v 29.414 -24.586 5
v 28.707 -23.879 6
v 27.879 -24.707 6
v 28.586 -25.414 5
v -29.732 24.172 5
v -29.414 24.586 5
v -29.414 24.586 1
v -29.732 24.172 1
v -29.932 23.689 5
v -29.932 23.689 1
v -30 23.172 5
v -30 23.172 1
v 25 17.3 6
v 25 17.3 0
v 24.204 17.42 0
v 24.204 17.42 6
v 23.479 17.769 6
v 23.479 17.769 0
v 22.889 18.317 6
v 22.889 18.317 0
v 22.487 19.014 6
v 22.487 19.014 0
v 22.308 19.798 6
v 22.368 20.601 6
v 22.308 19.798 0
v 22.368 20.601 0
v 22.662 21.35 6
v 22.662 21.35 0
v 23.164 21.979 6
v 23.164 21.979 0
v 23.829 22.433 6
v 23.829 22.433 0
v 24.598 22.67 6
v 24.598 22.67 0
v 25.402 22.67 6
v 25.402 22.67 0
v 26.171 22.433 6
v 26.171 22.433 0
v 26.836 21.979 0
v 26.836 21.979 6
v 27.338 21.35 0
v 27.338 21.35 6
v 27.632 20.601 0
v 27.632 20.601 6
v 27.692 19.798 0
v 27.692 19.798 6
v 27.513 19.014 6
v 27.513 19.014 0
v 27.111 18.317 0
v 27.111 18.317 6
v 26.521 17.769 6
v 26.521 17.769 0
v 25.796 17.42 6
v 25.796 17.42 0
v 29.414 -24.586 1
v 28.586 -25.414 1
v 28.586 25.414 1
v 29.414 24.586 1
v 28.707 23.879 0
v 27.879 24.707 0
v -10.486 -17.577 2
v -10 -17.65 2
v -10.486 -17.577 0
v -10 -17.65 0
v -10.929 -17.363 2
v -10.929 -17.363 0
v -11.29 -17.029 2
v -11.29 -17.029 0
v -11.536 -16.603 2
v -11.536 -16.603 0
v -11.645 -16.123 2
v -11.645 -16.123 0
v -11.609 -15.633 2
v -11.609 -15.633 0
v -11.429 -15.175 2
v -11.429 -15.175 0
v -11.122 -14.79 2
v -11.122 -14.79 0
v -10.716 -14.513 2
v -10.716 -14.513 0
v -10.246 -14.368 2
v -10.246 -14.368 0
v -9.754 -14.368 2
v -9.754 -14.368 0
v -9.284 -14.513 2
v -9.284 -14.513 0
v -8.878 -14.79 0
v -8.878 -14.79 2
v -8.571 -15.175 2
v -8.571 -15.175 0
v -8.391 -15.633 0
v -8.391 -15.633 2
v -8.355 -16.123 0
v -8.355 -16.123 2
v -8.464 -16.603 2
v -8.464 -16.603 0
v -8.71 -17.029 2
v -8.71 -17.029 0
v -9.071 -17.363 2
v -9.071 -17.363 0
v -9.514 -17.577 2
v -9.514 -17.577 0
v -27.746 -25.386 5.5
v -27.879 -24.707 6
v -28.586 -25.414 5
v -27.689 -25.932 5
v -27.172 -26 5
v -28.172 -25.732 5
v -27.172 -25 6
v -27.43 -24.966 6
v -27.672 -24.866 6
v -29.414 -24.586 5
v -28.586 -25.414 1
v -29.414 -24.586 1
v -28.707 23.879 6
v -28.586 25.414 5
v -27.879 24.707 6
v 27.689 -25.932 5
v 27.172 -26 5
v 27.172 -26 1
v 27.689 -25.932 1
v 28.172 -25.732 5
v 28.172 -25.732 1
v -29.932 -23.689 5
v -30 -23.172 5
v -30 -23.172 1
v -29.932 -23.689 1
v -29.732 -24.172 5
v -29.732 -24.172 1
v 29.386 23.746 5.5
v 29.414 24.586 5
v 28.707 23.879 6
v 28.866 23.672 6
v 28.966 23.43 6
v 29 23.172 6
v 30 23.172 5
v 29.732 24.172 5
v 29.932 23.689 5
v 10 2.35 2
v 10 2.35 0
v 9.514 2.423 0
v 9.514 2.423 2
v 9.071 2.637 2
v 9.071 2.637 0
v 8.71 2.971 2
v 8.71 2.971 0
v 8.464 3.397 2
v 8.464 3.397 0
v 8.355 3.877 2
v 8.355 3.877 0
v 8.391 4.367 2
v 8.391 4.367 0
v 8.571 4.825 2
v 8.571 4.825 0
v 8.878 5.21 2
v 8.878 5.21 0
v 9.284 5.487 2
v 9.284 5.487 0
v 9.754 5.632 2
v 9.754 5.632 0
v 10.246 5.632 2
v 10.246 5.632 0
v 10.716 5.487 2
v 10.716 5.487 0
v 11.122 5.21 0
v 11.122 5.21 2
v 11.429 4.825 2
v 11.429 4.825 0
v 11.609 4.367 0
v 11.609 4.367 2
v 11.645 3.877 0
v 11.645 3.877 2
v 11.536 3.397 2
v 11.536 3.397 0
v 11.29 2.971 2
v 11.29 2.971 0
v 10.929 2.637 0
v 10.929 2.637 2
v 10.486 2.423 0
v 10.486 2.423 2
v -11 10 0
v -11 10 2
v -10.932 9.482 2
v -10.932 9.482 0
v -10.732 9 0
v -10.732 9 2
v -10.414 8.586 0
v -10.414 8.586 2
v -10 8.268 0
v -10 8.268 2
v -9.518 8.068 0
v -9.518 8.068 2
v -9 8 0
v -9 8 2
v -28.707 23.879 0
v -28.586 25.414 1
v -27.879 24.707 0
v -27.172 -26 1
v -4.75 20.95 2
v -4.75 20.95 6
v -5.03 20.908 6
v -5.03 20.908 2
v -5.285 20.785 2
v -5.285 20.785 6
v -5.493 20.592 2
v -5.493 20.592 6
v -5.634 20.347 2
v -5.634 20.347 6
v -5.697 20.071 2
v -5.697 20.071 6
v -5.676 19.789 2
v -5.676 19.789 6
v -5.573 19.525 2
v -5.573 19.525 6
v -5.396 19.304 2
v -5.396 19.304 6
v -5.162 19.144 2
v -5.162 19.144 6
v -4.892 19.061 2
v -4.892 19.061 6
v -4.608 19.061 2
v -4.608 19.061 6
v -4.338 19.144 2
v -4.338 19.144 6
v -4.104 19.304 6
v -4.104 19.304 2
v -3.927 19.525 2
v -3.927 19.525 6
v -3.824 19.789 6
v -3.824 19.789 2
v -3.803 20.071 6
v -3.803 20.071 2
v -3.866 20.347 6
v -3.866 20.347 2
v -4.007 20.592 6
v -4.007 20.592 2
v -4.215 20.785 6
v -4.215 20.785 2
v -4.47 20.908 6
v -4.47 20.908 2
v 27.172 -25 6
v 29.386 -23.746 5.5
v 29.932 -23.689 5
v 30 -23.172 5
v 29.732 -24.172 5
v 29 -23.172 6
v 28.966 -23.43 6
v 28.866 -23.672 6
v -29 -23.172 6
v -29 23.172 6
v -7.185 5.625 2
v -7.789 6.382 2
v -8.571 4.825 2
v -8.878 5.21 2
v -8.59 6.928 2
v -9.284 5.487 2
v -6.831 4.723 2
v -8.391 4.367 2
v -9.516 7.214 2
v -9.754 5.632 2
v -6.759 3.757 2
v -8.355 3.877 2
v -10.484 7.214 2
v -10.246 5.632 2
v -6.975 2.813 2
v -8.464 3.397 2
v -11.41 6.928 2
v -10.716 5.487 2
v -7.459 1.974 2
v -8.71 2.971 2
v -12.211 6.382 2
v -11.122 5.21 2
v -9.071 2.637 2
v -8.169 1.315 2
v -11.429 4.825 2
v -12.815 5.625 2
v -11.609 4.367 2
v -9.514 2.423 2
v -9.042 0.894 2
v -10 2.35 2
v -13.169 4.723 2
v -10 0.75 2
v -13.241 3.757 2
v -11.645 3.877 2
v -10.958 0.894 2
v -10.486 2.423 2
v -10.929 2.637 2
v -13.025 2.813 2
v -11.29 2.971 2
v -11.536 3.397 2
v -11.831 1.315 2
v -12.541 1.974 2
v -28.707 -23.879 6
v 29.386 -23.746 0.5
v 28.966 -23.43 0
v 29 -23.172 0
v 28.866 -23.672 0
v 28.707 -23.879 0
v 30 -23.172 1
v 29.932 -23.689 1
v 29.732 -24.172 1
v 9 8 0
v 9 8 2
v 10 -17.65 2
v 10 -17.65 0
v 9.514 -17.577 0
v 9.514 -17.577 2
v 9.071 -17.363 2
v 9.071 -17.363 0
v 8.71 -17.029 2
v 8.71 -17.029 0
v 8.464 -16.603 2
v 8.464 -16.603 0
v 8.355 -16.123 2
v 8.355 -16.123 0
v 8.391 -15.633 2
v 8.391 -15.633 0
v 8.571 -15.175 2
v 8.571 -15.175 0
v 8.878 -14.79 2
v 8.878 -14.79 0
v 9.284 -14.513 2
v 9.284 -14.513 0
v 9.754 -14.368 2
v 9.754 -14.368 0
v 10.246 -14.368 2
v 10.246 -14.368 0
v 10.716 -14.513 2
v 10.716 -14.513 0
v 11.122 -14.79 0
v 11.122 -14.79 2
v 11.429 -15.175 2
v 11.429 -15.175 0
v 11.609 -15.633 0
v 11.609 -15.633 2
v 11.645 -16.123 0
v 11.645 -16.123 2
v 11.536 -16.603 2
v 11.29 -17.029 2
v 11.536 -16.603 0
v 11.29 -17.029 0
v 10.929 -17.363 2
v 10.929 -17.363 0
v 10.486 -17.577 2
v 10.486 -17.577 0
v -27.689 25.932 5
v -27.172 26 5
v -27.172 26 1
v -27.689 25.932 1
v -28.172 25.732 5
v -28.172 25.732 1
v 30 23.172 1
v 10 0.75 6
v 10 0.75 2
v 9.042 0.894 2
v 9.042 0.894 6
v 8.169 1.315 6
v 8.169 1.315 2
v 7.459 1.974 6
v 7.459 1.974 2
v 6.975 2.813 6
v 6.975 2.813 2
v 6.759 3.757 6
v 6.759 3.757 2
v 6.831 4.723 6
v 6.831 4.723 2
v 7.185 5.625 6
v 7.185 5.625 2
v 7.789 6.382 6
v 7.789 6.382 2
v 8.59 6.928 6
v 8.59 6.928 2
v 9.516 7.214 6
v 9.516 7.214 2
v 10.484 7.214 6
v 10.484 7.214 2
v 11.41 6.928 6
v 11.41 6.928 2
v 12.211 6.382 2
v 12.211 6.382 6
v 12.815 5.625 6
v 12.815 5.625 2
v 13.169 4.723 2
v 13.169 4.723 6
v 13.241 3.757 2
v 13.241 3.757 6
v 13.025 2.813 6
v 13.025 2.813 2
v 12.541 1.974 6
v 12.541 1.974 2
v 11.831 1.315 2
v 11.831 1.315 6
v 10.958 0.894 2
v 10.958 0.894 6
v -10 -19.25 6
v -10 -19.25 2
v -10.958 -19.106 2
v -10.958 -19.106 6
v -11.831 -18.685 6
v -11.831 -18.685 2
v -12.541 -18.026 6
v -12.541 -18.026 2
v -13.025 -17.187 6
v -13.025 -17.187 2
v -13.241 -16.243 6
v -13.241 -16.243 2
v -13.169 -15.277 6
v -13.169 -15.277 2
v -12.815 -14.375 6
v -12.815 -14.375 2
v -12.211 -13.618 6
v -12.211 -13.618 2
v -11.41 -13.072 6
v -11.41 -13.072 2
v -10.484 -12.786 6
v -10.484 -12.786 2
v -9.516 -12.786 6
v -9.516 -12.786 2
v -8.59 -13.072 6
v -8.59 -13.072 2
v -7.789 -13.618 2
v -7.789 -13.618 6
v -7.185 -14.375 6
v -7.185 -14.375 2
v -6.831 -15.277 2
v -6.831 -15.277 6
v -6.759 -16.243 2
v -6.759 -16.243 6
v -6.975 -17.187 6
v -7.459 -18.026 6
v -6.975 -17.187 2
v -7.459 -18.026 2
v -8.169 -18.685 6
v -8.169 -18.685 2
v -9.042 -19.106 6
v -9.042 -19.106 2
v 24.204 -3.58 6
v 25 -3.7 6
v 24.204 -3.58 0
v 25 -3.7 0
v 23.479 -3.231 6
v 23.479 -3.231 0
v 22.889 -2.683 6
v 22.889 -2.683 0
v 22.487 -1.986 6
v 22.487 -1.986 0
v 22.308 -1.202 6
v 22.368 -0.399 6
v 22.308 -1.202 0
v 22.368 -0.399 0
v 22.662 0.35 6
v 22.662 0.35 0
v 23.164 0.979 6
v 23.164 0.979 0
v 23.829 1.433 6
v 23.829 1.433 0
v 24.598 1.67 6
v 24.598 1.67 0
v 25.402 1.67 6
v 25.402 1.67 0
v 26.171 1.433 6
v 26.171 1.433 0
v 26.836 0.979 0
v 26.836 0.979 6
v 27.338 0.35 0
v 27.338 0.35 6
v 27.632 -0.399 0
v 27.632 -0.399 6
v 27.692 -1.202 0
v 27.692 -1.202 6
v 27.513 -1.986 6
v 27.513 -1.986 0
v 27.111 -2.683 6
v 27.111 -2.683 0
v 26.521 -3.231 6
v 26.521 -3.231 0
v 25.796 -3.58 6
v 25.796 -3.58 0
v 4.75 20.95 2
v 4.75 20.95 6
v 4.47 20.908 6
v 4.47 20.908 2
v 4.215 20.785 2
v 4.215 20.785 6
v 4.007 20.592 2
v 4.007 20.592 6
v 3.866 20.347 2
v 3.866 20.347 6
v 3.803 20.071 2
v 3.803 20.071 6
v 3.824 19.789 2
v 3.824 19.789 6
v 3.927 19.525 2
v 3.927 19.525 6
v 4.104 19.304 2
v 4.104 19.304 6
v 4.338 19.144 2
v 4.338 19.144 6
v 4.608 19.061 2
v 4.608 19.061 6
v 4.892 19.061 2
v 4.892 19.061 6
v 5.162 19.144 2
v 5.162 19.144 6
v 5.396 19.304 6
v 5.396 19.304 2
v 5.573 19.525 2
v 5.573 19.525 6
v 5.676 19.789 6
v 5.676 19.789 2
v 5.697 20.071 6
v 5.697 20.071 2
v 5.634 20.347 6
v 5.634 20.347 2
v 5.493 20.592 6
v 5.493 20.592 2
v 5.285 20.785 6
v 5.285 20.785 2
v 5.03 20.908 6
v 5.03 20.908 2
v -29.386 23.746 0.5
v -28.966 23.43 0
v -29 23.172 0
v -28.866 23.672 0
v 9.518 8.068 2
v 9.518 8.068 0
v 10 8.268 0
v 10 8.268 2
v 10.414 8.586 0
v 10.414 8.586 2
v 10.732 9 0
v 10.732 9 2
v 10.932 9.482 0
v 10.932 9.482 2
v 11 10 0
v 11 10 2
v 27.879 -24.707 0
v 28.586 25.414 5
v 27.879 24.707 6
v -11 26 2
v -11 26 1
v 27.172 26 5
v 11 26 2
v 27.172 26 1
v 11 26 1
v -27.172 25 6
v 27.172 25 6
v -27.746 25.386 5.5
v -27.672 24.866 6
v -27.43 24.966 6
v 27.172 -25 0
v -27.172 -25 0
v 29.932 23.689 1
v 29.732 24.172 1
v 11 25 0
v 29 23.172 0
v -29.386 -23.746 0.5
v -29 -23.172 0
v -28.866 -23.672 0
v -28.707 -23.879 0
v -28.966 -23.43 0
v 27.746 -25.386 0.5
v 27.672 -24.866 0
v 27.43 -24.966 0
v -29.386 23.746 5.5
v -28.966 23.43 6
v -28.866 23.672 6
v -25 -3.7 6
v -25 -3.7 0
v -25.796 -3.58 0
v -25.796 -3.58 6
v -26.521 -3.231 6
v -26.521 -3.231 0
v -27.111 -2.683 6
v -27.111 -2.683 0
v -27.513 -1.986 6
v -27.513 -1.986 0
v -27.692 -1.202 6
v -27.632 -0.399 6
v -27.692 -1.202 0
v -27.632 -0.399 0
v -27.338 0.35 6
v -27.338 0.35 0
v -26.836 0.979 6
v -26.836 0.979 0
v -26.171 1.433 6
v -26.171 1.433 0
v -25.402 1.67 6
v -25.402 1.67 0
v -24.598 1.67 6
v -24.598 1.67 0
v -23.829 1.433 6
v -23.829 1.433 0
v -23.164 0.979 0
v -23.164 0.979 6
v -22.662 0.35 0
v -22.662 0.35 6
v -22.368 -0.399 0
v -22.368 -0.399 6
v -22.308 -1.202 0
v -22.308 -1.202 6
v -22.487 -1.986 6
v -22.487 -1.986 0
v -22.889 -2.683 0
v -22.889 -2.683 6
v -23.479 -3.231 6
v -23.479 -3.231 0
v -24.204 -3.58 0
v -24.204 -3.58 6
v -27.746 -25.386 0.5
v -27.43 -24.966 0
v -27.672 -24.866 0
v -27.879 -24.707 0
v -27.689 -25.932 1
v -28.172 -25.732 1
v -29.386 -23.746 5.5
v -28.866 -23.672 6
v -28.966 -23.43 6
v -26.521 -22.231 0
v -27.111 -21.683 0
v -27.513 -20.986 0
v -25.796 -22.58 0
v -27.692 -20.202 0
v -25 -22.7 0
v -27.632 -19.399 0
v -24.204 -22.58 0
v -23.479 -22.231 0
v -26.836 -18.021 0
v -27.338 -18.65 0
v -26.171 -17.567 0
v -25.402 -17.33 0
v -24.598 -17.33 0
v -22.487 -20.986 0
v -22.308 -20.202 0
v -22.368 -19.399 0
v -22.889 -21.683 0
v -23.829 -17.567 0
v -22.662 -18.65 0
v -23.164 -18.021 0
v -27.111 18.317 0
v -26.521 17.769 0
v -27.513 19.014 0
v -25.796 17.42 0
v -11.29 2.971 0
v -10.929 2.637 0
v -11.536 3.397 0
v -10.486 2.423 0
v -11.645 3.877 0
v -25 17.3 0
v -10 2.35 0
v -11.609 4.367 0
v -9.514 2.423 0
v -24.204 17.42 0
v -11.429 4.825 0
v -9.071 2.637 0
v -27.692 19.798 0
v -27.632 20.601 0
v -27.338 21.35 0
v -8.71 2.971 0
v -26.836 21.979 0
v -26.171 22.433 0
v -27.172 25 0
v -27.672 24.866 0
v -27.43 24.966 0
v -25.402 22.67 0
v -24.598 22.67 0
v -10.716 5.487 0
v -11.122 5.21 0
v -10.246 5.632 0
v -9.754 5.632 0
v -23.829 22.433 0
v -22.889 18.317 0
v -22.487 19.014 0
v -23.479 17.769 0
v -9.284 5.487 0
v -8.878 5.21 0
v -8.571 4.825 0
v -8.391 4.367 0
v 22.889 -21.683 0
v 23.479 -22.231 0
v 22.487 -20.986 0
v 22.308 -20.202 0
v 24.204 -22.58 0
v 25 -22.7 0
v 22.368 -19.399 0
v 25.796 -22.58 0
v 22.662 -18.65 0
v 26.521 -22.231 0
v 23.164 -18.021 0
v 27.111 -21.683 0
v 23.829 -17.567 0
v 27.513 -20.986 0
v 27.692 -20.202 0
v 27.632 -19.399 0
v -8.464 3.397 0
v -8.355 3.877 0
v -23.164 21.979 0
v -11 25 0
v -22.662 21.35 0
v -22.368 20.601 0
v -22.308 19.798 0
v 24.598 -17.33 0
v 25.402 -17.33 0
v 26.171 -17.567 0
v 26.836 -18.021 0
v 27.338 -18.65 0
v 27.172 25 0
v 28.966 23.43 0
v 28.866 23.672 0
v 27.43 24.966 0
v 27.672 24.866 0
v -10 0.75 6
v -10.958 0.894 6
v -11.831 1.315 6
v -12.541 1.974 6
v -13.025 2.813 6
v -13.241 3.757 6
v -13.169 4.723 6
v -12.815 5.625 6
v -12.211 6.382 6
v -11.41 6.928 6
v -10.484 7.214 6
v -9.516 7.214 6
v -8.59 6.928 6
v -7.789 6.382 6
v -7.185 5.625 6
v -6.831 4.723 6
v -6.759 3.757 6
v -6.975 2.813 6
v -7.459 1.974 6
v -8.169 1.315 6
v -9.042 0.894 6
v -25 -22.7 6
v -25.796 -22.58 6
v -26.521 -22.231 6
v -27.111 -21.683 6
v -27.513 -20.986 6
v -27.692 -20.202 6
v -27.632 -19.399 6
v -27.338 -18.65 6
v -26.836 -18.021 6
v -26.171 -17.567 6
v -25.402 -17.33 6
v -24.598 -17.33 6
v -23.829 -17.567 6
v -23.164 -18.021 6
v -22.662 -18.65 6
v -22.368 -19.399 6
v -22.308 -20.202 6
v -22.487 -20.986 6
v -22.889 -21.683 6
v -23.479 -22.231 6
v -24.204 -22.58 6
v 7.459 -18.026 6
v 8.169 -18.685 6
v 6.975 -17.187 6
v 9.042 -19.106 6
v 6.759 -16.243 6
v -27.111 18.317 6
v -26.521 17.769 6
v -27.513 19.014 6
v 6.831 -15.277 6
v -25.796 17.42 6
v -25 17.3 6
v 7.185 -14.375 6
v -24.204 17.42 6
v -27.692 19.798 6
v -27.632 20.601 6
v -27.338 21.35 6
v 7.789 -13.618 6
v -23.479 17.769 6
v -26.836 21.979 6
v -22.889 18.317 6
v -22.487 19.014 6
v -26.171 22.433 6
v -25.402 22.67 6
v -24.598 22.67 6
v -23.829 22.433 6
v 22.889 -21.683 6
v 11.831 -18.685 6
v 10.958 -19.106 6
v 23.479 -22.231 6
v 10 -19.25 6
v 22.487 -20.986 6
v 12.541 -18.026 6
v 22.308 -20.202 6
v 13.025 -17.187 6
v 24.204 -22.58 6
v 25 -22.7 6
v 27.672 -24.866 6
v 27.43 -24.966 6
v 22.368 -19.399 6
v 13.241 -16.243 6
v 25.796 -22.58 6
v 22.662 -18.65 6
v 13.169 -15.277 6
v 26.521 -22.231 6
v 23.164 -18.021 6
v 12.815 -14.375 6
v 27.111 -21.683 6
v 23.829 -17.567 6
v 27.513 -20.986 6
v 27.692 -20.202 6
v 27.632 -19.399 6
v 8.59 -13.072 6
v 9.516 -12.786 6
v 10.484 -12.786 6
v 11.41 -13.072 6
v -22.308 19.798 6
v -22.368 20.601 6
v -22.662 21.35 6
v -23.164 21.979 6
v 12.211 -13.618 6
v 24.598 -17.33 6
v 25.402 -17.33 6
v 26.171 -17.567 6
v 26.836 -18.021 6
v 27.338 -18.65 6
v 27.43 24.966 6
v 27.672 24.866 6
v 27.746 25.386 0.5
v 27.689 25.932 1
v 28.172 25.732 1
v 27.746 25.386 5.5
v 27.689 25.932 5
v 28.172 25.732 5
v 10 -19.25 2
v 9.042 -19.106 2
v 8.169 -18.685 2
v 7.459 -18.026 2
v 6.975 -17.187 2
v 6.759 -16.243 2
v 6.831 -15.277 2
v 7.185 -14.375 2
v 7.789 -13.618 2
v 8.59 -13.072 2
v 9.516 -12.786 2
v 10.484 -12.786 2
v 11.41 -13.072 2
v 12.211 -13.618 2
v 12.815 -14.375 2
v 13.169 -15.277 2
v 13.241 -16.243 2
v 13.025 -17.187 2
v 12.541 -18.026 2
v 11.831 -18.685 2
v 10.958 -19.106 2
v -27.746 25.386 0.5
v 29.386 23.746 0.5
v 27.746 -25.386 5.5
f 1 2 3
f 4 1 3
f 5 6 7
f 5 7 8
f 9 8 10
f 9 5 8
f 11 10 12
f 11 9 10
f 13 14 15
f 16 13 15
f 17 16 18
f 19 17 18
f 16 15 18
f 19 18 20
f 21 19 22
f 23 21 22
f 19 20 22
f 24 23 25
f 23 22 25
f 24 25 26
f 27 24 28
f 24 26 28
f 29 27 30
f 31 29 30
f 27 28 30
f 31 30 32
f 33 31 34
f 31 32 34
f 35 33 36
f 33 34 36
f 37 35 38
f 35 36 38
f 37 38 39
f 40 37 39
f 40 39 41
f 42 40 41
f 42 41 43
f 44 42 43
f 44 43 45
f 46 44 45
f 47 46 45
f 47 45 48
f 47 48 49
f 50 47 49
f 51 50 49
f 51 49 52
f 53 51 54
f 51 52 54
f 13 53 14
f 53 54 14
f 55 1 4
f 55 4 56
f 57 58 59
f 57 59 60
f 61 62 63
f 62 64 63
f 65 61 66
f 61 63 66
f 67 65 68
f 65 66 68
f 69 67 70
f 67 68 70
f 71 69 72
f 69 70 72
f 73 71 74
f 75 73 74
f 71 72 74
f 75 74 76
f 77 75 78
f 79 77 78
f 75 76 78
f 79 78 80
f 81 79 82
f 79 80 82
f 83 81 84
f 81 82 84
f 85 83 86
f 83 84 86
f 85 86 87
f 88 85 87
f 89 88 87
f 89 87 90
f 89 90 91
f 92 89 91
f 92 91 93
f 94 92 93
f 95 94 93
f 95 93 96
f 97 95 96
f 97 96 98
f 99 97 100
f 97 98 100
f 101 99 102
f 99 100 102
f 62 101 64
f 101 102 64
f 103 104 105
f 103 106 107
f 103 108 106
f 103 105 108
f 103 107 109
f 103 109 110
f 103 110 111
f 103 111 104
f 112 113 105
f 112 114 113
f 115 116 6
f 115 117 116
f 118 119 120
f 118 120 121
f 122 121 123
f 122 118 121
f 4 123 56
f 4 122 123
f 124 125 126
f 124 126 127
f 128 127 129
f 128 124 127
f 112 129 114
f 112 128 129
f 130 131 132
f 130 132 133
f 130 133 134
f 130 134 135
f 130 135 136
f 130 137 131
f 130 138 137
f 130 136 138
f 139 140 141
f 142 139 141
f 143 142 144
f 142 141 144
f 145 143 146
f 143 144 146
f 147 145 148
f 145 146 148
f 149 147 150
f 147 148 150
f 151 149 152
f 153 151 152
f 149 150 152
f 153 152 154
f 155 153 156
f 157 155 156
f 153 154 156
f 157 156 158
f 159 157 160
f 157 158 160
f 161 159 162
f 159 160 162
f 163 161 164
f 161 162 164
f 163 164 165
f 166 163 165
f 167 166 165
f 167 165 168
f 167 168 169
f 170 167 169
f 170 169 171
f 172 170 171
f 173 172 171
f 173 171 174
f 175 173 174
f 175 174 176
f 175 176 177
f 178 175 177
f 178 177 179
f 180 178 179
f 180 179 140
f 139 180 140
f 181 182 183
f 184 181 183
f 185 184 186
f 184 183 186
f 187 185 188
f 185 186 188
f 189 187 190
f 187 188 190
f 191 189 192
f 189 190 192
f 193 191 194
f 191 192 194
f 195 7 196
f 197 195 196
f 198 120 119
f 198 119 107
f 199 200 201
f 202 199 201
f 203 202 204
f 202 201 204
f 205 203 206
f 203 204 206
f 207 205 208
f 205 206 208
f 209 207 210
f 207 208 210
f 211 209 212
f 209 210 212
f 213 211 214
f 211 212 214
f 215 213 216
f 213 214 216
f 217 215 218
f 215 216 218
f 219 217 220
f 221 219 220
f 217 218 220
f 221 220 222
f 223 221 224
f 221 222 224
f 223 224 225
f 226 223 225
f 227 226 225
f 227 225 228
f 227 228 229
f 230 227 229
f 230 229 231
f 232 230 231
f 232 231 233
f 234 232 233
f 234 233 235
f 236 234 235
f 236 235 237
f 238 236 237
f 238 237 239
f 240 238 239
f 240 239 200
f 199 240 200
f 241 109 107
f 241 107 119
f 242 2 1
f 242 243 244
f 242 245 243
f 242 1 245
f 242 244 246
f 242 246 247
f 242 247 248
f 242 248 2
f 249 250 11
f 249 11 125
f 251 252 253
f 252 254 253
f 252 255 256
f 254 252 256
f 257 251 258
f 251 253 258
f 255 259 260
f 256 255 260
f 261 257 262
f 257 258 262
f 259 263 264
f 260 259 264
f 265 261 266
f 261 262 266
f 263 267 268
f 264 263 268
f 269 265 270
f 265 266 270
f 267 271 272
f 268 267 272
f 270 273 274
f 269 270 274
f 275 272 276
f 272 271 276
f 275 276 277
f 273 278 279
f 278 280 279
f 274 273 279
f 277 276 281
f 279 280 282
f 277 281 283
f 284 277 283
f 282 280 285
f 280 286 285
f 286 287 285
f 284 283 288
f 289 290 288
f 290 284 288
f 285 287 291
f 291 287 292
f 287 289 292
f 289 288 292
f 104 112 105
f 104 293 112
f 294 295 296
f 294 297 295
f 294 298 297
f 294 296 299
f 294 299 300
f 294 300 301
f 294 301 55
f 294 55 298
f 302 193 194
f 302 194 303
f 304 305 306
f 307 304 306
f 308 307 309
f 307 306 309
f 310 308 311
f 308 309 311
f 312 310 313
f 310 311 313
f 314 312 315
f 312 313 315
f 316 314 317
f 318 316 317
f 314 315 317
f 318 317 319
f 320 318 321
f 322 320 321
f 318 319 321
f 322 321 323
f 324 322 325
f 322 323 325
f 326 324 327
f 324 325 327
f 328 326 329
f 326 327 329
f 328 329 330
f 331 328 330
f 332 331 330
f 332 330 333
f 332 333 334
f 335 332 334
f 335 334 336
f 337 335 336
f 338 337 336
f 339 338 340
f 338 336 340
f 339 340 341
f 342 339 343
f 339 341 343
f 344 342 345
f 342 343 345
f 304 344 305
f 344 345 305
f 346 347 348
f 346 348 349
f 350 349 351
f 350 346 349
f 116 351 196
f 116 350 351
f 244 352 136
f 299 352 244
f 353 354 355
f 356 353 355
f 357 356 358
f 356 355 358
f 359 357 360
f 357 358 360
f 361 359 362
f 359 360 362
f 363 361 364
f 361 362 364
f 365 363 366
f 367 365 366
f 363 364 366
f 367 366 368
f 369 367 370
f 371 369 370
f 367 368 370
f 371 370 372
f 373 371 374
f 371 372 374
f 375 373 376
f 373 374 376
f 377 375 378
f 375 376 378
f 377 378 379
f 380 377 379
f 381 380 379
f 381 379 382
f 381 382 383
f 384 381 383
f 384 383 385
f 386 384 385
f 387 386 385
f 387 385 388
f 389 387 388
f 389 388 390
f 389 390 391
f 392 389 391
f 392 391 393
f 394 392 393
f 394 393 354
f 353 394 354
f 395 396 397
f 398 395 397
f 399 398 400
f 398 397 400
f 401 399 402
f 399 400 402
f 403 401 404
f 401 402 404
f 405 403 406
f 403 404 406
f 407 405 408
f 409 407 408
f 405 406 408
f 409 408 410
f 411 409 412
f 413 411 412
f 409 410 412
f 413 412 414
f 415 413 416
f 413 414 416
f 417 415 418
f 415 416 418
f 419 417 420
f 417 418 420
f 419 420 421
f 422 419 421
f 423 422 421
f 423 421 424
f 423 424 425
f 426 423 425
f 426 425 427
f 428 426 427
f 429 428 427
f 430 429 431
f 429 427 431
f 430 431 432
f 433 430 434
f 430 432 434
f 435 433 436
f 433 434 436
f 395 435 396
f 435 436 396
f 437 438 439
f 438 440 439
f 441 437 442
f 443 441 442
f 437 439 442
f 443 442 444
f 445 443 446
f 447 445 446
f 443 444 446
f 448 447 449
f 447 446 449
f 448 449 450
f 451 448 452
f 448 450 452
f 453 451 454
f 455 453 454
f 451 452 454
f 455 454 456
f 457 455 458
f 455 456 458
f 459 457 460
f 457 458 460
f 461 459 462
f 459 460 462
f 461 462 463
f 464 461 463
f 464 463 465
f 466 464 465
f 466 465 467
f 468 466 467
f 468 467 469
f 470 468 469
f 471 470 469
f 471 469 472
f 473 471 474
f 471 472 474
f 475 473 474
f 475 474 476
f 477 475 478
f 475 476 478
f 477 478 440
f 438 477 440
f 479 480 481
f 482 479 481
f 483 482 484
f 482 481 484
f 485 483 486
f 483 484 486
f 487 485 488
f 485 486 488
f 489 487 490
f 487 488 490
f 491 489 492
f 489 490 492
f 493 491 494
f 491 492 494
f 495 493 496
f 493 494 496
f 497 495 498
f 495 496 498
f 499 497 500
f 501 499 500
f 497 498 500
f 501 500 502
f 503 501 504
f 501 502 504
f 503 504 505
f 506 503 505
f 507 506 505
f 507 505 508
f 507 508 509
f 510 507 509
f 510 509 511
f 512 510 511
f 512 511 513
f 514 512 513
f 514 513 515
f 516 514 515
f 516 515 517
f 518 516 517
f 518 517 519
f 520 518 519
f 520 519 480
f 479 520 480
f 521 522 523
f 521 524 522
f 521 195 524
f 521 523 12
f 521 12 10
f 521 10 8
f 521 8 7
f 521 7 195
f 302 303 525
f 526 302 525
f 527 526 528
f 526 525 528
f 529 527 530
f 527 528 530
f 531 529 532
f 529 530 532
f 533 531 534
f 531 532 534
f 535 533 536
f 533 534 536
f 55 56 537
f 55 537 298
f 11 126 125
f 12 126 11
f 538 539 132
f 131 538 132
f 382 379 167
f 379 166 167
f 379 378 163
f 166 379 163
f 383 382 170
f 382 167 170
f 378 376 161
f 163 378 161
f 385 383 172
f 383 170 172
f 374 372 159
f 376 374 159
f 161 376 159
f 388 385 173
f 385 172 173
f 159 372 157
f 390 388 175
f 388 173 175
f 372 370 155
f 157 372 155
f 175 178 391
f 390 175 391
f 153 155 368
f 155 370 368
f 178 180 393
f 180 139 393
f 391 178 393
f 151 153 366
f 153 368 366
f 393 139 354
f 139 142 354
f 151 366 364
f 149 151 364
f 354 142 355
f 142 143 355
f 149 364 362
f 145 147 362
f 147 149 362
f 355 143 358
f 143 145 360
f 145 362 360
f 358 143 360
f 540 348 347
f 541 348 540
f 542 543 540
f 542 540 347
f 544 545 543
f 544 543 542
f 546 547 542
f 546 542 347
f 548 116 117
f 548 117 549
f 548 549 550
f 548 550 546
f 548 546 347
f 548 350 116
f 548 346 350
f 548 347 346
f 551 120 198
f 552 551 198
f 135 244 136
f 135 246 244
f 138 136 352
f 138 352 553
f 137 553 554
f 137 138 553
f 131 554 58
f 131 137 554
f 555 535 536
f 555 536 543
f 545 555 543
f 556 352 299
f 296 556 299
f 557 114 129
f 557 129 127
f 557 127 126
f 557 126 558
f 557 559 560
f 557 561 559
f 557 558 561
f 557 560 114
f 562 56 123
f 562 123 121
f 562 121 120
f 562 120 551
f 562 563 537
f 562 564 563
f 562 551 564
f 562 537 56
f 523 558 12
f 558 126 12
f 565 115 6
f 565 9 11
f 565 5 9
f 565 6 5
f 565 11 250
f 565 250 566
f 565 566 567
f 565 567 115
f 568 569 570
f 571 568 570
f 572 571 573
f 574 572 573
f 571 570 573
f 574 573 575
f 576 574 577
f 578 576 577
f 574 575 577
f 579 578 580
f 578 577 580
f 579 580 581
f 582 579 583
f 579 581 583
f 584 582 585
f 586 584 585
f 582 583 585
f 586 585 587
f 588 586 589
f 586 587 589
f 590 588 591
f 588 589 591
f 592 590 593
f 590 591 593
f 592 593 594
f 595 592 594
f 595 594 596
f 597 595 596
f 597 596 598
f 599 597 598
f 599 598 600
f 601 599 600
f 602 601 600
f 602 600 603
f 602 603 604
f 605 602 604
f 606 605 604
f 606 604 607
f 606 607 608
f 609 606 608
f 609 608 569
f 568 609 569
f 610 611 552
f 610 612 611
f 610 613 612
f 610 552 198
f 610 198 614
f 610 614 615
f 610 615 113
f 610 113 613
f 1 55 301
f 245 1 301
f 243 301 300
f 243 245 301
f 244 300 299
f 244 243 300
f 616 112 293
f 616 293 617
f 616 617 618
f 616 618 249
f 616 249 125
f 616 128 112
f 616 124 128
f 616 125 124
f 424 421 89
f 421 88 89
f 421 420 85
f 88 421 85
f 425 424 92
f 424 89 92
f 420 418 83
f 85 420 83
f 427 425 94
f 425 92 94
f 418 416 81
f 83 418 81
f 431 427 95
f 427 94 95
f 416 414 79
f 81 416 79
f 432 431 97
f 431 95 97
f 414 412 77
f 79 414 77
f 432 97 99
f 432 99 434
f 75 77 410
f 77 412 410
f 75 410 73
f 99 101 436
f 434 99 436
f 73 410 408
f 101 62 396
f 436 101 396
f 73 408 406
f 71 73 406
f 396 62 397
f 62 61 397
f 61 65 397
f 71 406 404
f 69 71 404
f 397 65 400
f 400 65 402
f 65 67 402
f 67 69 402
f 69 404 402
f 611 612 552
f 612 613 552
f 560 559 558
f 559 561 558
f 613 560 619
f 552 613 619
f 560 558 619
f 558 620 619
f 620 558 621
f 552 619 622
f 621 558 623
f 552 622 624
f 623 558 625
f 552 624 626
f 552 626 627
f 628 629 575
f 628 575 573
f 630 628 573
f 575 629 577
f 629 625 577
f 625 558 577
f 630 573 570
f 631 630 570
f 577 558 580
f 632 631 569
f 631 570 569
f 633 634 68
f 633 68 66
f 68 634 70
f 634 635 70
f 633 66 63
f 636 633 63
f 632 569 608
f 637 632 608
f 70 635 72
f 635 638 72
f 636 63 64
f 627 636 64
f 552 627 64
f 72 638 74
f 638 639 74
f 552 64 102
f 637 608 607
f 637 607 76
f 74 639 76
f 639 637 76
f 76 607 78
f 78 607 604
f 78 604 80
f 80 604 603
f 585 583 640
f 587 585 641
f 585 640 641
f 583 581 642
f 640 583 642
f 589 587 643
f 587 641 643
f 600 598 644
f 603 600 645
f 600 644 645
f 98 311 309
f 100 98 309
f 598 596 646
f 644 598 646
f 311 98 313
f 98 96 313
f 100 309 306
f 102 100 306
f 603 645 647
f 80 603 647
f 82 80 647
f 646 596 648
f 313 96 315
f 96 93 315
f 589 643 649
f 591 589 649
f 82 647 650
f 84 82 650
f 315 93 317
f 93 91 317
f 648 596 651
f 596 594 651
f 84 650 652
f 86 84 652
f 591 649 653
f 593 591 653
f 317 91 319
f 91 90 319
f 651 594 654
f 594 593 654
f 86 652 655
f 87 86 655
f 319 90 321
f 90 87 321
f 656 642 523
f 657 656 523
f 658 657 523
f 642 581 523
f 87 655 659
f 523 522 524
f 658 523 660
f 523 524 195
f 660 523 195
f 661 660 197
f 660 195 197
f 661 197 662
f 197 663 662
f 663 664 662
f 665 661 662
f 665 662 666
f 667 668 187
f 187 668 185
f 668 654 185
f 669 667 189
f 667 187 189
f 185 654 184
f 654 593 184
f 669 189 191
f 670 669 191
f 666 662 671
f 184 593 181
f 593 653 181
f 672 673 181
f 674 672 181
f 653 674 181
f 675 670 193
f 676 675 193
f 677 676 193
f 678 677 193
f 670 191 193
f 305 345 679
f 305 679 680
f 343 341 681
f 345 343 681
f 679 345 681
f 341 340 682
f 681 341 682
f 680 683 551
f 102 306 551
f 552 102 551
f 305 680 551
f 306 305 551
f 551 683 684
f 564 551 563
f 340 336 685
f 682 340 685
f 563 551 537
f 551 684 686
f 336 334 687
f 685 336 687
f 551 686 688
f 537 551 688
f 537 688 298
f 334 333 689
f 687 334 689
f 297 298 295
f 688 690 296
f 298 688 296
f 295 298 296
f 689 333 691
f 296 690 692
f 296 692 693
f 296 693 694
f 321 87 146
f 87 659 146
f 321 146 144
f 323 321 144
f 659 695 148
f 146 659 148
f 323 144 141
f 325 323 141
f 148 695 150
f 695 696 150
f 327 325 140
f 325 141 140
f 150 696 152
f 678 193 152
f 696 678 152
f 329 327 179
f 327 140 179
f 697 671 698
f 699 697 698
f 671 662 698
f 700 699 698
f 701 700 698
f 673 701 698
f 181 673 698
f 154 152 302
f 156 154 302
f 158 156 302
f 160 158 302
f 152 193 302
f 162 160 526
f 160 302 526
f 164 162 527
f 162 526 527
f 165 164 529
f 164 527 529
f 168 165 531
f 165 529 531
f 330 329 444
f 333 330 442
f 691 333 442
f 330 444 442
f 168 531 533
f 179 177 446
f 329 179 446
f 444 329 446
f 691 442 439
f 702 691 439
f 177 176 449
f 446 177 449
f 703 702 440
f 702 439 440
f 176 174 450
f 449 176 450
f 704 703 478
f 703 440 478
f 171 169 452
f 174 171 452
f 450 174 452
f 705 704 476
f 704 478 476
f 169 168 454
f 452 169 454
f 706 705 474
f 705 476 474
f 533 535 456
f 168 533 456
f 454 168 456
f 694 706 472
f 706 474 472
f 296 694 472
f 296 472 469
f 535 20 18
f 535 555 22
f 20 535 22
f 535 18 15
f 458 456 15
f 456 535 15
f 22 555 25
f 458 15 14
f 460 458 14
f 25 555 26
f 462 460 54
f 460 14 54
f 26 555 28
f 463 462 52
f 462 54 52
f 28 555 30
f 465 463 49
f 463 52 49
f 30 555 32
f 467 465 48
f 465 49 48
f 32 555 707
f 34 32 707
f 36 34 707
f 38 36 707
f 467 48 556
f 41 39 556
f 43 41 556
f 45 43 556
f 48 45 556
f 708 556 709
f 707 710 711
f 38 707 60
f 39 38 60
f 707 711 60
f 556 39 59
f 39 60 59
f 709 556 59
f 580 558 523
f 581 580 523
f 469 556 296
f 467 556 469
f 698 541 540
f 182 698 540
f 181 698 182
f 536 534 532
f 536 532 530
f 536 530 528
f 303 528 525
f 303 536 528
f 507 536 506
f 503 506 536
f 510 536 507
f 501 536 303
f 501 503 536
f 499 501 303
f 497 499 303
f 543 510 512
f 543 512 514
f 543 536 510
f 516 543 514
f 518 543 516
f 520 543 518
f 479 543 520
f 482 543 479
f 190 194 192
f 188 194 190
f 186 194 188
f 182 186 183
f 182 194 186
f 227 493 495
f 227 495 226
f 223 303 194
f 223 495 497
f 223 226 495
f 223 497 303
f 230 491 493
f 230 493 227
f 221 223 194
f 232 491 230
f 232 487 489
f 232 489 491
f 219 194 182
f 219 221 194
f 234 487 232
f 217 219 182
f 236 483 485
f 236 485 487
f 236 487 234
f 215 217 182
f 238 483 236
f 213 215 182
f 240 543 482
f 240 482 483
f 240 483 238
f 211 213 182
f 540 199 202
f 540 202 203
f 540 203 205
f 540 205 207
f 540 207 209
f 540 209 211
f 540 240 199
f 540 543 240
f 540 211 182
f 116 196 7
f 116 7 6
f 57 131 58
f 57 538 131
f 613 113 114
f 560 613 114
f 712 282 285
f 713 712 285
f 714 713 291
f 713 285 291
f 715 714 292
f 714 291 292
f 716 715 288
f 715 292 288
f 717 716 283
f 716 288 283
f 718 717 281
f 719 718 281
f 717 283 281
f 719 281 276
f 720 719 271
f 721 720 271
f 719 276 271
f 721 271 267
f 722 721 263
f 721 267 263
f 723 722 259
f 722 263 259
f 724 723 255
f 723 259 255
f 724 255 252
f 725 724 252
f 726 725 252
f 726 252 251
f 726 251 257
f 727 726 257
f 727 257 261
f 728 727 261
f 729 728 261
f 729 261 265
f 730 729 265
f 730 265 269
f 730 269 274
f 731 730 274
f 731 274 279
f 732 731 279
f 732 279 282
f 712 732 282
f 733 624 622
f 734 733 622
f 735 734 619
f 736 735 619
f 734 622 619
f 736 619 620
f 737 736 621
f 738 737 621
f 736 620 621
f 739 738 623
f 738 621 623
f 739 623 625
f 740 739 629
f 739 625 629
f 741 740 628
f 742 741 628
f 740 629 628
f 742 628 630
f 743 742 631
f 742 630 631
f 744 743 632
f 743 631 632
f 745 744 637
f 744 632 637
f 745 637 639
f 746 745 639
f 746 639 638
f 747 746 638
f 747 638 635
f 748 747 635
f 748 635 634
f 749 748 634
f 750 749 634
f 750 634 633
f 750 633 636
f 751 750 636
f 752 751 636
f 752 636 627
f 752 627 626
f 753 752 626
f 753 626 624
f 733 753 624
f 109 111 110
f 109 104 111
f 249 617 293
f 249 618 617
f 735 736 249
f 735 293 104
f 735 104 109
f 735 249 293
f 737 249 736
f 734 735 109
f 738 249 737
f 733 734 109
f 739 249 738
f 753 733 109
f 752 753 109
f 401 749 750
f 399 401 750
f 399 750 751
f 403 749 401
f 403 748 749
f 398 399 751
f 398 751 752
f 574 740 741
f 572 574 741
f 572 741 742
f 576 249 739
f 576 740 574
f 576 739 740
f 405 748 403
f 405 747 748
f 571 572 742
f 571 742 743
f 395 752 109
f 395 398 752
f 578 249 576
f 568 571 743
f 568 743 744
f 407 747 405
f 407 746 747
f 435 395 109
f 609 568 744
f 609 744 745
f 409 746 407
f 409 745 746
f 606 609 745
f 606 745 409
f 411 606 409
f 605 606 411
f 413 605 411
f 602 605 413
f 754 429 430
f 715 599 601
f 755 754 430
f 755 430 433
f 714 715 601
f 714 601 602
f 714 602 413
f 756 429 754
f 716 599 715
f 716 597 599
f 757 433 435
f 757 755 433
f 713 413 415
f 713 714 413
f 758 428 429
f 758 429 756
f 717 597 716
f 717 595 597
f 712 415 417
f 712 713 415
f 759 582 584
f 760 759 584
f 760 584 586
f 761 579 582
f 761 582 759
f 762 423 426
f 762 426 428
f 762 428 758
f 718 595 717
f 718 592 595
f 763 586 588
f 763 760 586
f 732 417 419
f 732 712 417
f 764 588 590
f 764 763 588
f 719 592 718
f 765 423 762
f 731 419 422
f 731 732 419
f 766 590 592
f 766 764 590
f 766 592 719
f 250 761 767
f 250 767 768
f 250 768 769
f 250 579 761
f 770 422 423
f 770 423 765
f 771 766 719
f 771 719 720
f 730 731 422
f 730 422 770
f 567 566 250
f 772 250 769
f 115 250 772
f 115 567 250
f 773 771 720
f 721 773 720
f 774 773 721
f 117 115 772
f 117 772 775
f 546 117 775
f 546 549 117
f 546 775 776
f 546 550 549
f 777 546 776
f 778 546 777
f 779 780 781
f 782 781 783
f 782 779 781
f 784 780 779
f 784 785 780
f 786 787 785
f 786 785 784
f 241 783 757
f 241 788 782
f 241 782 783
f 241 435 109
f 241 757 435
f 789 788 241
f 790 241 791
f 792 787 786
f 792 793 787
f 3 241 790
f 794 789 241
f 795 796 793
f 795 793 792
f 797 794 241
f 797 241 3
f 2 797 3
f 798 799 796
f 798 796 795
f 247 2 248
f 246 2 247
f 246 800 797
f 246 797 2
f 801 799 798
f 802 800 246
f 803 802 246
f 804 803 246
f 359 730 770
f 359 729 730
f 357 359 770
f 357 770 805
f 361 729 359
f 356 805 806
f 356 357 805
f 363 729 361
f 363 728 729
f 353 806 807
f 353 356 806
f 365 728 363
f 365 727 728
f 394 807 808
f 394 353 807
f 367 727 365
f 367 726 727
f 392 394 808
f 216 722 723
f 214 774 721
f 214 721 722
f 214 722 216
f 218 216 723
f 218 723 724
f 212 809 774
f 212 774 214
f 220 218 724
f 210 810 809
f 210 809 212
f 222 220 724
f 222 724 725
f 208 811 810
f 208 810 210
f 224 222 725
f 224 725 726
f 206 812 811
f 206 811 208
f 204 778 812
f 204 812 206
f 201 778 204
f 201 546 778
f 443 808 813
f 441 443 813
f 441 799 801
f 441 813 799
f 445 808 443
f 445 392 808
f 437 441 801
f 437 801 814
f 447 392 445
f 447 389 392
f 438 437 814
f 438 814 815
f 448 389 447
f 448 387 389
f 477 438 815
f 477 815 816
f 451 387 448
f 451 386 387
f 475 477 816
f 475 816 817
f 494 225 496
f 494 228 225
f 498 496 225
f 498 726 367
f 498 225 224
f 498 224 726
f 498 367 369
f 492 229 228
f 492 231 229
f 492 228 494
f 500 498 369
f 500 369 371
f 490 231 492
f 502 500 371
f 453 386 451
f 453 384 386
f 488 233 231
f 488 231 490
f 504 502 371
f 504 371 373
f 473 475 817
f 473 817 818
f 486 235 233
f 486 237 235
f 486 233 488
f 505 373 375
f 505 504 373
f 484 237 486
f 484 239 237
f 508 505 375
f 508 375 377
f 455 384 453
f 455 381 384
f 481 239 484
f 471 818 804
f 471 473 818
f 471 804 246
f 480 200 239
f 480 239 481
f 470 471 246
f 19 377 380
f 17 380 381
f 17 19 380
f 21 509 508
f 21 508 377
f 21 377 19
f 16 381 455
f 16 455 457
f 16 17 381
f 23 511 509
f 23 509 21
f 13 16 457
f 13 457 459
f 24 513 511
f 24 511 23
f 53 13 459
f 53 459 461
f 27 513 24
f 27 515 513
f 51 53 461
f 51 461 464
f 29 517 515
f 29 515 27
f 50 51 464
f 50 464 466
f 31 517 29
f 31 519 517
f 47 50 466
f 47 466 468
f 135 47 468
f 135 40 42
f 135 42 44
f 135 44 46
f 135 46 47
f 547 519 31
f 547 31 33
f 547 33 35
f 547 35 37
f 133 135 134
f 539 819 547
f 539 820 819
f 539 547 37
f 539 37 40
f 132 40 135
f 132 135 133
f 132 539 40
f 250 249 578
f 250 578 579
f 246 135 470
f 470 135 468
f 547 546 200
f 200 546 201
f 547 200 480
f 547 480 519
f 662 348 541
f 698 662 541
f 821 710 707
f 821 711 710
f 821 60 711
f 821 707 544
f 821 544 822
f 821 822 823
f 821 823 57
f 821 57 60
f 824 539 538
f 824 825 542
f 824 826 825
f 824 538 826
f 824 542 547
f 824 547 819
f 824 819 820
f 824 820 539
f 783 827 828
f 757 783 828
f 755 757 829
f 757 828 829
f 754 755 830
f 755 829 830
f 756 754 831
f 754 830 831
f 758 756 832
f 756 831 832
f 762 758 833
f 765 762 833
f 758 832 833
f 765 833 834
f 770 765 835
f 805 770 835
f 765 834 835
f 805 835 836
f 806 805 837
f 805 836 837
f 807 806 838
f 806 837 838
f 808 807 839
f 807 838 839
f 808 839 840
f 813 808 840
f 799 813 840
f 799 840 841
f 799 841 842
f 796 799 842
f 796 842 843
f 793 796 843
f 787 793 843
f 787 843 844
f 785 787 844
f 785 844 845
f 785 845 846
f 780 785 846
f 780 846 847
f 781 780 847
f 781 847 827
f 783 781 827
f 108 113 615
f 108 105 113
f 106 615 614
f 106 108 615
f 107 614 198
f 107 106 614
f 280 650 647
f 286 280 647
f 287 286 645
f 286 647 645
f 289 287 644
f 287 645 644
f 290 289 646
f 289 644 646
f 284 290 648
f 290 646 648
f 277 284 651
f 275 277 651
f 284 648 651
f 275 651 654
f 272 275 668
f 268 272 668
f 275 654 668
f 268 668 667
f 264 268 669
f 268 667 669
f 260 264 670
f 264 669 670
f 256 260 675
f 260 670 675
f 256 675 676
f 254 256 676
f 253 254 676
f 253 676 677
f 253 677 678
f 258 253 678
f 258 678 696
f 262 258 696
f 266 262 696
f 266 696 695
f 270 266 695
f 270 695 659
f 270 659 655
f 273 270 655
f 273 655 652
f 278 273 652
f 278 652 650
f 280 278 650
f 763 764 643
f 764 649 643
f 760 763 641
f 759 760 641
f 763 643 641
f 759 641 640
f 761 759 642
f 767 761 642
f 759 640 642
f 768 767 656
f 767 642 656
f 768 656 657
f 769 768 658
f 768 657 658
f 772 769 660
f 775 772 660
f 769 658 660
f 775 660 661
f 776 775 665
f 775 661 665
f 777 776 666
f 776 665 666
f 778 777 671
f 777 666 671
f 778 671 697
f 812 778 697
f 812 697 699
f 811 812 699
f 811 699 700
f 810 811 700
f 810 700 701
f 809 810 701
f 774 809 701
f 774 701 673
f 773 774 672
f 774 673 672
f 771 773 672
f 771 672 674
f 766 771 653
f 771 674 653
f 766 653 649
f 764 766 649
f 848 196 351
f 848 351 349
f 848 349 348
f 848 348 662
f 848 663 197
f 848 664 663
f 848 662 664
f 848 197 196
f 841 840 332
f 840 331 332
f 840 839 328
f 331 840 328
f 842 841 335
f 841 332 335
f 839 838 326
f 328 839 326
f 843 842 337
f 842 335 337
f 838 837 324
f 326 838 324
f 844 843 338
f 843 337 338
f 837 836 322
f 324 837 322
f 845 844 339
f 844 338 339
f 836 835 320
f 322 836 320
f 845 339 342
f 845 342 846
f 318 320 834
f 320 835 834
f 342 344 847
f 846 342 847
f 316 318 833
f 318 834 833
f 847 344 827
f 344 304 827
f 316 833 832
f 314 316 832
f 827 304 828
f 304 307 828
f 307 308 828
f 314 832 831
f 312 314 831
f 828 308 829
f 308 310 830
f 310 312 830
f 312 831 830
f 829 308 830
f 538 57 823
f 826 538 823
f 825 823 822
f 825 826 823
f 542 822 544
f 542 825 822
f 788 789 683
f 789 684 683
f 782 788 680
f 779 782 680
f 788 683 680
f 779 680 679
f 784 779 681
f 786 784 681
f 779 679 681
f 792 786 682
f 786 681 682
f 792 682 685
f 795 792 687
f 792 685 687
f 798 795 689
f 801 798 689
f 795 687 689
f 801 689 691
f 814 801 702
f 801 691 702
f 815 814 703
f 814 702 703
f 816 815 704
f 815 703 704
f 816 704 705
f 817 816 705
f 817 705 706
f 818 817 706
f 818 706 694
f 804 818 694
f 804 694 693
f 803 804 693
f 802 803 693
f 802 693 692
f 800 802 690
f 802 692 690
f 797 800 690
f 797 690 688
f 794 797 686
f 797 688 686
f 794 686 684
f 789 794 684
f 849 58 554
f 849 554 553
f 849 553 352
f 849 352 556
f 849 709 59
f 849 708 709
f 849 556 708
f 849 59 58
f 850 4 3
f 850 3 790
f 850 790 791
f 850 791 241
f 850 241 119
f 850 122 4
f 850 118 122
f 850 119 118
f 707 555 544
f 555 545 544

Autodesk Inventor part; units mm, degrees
ref_plane "YZ Plane" through (0, 0, 0) normal (1, 0, 0) x (0, 1, 0)
ref_plane "XZ Plane" through (0, 0, 0) normal (0, 1, 0) x (-1, 0, 0)
ref_plane "XY Plane" through (0, 0, 0) normal (0, 0, 1) x (1, 0, 0)
sketch "スケッチ1" plane through (0, 0, 0) normal (0, 0, 1) x (1, 0, 0)
  line L0 (30, -26) -> (-30, -26)
  line L1 (-30, -26) -> (-30, 26)
  line L2 (-30, 26) -> (30, 26)
  line L3 (30, 26) -> (30, -26)
  line L4 (30, -26) -> (-30, 26) construction
  line L5 (-30, -26) -> (30, 26) construction
  point P0 (0, 0)
  dimension "d0" = 60
  dimension "d1" = 52
extrude "押し出し1" add sketch "スケッチ1" along normal blind 6
sketch "スケッチ2" plane through (0, 0, 6) normal (0, 0, 1) x (1, 0, 0)
  line L0 (25, -20) -> (-25, -20)
  line L1 (-25, -20) -> (-25, 20)
  line L2 (-25, 20) -> (25, 20)
  line L3 (25, 20) -> (25, -20)
  line L4 (25, -20) -> (-25, 20) construction
  line L5 (-25, -20) -> (25, 20) construction
  line L6 (-30, -26) -> (30, -26) projected
  point P0 (0, 0)
  point P1 (0, 0)
  point P2 (-25, -1)
  point P3 (25, -1)
  dimension "d4" = 50
  dimension "d5" = 40
  dimension "d6" = 6
hole "穴1" at (-25, -1, 6) at (25, -1, 6) at (25, 20, 6) at (-25, 20, 6) at (-25, -20, 6) at (25, -20, 6) direction (0, 0, -1) diameter 5.4 depth 8.8
sketch "スケッチ3" plane through (0, 0, 6) normal (0, 0, 1) x (1, 0, 0)
  line L0 (-10, -16) -> (10, -16)
  line L1 (10, -16) -> (10, 4)
  line L2 (10, 4) -> (-10, 4)
  line L3 (-10, 4) -> (-10, -16)
  line L4 (-10, -16) -> (10, 4) construction
  line L5 (10, -16) -> (-10, 4) construction
  line L6 (-30, -26) -> (30, -26) projected
  point P0 (0, 0)
  point P1 (0, -6)
  dimension "d14" = 20
  dimension "d15" = 20
  dimension "d16" = 10
hole "穴2" at (-10, -16, 6) at (-10, 4, 6) at (10, 4, 6) at (10, -16, 6) direction (0, 0, -1) diameter 3.3 depth 8.8 counterbore diameter 6.5 counterbore depth 4
sketch "スケッチ4" plane through (0, 0, 0) normal (0, 0, -1) x (-1, 0, 0)
  circle A0 centre (-10, 4) radius 1.65 projected
  circle A1 centre (10, -16) radius 1.65 projected
  circle A2 centre (10, 4) radius 1.65 projected
  circle A3 centre (-10, -16) radius 1.65 projected
  circle A4 centre (25, -20) radius 2.7 projected
  circle A5 centre (-25, 20) radius 2.7 projected
  circle A6 centre (25, -1) radius 2.7 projected
  circle A7 centre (-25, -1) radius 2.7 projected
  circle A8 centre (25, 20) radius 2.7 projected
  circle A9 centre (-25, -20) radius 2.7 projected
  line L0 (-30, -26) -> (-30, 26) projected
  line L1 (30, -26) -> (-30, -26) projected
  line L2 (30, 26) -> (30, -26) projected
  line L3 (-30, 26) -> (30, 26) projected
  line L4 (-30, 26) -> (30, 26) projected
  line L5 (-11, 26) -> (11, 26)
  line L6 (11, 26) -> (11, 8)
  line L7 (11, 8) -> (-11, 8)
  line L8 (-11, 8) -> (-11, 26)
  point P0 (0, 0)
  point P1 (11, 26)
  point P2 (-11, 26)
  dimension "d24" = 22
  dimension "d25" = 18
  dimension "d26" = 11
extrude "押し出し2" cut sketch "スケッチ4" against normal blind 2 contours L3 L6 L7 L8
chamfer "面取り1" distance 2 angle 45 4 edges at (-30, 26, 3) (-30, -26, 3) (30, -26, 3) (30, 26, 3)
fillet "フィレット1" radius 2 8 edges at (30, 24, 3) (28, 26, 3) (-28, 26, 3) (-30, 24, 3) (-30, -24, 3) (-28, -26, 3) (28, -26, 3) (30, -24, 3)
sketch "スケッチ5" plane through (0, 0, 2) normal (0, 0, -1) x (-1, 0, 0)
  line L0 (11, 26) -> (11, 8) projected
  line L1 (-11, 26) -> (11, 26) projected
  line L2 (-11, 8) -> (-11, 26) projected
  line L3 (11, 8) -> (-11, 8) projected
  point P0 (0, 0)
  point P1 (-4.75, 20)
  point P2 (4.75, 20)
  dimension "d33" = 9.5
  dimension "d34" = 4.75
  dimension "d35" = 6
hole "穴3" at (4.75, 20, 2) at (-4.75, 20, 2) direction (0, 0, 1) diameter 1.9 depth 8.8
fillet "フィレット2" radius 2 2 edges at (11, 8, 1) (-11, 8, 1)
chamfer "面取り2" distance 1 angle 45 33 edges at (19.0858, 26, 0) (27.9369, 25.8478, 0) (29, 25, 0) (29.8478, 23.9369, 0) (30, 0, 0) (29.8478, -23.9369, 0) (29, -25, 0) (27.9369, -25.8478, 0) (0, -26, 0) (-27.9369, -25.8478, 0) (-29, -25, 0) (-29.8478, -23.9369, 0) (-30, 0, 0) (-29.8478, 23.9369, 0) (-29, 25, 0) (-27.9369, 25.8478, 0) (-19.0858, 26, 0) (0, 26, 6) (-27.9369, 25.8478, 6) (-29, 25, 6) (-29.8478, 23.9369, 6) (-30, 0, 6) (-29.8478, -23.9369, 6) (-29, -25, 6) (-27.9369, -25.8478, 6) (0, -26, 6) (27.9369, -25.8478, 6) (29, -25, 6) (29.8478, -23.9369, 6) (30, 0, 6) (29.8478, 23.9369, 6) (29, 25, 6) (27.9369, 25.8478, 6)
properties part number "Diode_Laser_Mount"
